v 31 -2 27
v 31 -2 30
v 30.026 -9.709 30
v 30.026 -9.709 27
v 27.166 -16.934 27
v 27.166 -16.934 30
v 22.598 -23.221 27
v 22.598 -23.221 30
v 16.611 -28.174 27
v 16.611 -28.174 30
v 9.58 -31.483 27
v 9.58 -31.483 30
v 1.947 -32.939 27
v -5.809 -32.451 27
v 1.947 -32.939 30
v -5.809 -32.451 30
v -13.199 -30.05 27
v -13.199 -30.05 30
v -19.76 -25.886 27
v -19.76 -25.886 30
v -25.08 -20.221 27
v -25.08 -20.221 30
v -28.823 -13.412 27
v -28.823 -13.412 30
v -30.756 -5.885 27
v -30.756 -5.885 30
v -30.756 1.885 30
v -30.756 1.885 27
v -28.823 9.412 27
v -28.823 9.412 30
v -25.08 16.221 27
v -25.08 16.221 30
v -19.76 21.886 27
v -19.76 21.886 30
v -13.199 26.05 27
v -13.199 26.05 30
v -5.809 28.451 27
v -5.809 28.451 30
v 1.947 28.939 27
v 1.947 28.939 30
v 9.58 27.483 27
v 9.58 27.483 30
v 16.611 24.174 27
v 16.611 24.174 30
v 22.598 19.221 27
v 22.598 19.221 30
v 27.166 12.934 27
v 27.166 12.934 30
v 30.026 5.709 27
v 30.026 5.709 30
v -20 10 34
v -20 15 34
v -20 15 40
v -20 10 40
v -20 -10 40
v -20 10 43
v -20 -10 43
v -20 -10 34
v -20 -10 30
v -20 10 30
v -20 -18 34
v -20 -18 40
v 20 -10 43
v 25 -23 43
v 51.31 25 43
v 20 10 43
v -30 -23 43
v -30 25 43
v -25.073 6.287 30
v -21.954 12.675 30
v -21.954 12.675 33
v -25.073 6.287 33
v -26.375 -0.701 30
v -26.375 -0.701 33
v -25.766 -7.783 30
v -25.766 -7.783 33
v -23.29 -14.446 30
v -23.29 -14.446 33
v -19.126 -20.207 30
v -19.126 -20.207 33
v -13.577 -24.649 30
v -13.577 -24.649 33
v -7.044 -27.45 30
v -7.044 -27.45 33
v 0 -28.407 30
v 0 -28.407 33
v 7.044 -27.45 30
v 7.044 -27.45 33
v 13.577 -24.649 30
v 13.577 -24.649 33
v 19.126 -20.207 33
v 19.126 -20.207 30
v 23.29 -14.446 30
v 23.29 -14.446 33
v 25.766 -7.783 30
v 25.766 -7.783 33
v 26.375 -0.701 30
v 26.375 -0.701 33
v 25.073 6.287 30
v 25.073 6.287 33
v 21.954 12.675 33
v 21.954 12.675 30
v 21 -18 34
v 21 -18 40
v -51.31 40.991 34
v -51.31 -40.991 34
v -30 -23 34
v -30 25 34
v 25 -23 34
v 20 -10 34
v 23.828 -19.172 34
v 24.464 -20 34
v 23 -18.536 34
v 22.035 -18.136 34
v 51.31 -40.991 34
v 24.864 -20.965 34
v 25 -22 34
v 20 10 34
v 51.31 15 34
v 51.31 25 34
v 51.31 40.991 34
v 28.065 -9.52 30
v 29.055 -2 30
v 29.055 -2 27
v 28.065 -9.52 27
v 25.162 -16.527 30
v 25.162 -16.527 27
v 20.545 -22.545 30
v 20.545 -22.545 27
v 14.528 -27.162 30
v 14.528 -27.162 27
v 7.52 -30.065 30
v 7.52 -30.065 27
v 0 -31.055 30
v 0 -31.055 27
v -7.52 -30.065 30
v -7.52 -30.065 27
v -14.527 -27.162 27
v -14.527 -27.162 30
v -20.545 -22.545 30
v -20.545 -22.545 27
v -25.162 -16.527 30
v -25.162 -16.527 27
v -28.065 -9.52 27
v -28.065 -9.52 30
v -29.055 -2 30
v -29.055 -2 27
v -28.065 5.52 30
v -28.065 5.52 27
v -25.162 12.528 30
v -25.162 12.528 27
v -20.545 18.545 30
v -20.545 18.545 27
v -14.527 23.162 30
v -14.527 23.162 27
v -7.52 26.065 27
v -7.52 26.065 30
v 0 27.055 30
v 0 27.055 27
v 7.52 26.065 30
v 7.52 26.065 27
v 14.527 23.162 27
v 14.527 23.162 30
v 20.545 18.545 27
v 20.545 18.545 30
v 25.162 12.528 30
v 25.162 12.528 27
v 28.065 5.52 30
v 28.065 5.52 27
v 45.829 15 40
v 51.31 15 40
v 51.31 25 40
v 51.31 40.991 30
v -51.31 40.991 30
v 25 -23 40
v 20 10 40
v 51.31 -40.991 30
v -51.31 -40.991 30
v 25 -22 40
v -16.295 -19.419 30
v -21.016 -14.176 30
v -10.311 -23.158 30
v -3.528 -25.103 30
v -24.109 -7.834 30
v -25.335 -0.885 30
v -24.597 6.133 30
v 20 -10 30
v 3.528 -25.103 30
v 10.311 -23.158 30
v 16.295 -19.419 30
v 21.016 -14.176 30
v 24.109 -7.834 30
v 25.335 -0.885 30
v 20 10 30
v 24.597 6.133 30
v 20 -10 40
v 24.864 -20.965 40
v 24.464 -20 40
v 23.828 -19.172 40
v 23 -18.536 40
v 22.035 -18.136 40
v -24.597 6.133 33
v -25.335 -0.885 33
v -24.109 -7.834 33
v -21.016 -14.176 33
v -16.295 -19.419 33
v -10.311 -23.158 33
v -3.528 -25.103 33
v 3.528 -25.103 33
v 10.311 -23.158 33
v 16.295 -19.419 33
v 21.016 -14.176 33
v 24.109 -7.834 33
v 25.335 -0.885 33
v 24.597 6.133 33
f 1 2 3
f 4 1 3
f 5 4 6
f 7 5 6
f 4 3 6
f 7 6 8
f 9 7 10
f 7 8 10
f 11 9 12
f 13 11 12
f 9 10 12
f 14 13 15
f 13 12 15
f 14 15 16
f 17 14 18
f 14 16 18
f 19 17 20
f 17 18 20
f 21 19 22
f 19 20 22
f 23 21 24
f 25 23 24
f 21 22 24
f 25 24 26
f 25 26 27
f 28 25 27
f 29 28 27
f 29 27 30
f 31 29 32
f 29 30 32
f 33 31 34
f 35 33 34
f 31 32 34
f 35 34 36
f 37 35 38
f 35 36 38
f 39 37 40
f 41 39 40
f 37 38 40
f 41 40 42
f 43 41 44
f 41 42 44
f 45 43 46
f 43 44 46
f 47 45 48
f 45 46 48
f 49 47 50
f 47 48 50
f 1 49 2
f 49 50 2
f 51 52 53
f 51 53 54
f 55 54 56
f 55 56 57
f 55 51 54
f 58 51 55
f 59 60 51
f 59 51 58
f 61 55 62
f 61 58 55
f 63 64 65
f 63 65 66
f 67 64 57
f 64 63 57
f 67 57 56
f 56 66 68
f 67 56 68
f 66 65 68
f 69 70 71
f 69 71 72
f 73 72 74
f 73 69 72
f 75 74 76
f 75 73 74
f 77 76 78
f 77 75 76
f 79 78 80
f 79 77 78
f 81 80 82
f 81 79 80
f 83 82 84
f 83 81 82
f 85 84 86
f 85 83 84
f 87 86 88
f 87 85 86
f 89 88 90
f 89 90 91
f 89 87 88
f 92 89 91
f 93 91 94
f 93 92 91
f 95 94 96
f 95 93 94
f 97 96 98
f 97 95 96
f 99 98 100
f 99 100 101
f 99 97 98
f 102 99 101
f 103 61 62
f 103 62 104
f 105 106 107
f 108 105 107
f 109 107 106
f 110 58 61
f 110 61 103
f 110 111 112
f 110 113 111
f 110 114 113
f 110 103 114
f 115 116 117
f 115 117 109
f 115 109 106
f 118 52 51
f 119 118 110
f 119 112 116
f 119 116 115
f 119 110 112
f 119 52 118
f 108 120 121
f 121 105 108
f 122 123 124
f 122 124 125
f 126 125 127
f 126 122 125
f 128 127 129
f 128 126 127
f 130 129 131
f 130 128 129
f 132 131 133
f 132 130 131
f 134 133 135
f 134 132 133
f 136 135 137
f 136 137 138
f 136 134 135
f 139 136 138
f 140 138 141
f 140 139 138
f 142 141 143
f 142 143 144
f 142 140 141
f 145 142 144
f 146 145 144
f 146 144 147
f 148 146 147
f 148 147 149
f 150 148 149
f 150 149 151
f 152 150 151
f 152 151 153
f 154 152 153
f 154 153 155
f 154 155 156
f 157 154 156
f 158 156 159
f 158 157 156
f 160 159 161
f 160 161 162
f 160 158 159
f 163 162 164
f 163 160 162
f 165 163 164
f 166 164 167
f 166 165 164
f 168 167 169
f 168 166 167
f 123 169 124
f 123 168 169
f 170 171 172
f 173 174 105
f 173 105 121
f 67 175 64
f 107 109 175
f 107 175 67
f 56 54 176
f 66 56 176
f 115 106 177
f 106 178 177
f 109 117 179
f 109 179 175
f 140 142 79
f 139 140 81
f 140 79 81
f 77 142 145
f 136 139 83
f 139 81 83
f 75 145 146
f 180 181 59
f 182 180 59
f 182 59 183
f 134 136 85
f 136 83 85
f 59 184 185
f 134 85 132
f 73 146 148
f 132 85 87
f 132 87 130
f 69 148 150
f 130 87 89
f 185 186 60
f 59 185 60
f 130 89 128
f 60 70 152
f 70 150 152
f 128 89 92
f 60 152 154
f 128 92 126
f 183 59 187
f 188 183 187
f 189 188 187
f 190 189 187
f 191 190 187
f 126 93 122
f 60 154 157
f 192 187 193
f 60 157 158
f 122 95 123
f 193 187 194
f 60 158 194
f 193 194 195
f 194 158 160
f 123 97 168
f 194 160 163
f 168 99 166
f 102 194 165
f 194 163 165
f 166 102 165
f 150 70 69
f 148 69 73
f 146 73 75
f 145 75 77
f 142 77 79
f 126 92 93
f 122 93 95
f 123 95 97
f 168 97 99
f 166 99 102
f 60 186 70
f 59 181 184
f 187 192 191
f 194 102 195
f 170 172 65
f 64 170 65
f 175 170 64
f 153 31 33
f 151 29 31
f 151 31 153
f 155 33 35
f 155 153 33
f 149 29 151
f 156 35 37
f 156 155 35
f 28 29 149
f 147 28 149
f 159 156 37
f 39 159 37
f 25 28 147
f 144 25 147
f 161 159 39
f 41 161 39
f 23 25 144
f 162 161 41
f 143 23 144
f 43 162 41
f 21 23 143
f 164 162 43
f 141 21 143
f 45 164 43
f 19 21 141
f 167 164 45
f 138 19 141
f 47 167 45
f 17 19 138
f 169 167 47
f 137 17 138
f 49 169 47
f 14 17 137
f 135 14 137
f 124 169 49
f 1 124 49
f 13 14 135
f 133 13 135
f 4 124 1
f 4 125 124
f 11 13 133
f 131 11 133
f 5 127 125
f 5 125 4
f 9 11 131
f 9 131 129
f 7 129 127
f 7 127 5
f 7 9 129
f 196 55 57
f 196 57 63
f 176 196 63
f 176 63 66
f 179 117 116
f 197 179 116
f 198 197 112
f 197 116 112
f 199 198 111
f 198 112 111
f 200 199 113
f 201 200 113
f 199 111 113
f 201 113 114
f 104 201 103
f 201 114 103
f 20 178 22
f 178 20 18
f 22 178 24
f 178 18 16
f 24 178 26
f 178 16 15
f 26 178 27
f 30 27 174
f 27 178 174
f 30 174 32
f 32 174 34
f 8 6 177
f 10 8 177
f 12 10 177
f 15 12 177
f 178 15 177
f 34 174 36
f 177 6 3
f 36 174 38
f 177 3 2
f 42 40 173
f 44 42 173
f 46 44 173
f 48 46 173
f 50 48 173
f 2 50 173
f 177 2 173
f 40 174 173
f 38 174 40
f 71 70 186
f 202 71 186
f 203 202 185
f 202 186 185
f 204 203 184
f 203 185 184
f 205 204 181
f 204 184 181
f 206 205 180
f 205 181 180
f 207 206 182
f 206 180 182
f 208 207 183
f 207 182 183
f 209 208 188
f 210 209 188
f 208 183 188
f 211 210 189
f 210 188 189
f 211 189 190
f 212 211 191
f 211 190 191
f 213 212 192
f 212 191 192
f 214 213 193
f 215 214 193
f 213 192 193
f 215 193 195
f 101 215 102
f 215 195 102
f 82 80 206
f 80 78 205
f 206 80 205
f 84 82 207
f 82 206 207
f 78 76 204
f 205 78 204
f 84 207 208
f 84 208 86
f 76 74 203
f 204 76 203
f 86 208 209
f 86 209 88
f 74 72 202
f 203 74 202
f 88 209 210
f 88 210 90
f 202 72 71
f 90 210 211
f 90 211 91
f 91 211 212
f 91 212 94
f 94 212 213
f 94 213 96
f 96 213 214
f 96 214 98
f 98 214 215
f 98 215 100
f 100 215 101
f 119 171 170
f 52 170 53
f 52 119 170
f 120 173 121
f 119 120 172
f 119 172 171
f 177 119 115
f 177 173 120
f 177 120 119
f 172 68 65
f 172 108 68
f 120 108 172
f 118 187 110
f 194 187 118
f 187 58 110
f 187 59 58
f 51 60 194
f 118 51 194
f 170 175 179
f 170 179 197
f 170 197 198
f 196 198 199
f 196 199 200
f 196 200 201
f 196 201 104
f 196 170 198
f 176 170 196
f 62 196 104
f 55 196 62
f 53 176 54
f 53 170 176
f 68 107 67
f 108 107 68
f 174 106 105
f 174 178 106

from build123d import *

# Parameters (mm, degrees)
SKETCH005_W     = 102.620446
SKETCH005_H     = 81.982758
PAD005_DEPTH    = 3
SKETCH006_W     = 102.620446
SKETCH006_H     = 81.982758
SKETCH006_W_2   = 40
SKETCH006_H_2   = 20
PAD006_DEPTH    = 1
PAD006_FACE18_W = 20
PAD006_FACE18_H = 40
POCKET_DEPTH    = 3.001
SKETCH007_R     = 31
SKETCH007_R_2   = 29.055
PAD007_DEPTH    = 3
PAD013_DEPTH    = 6
SKETCH014_W     = 40
SKETCH014_H     = 20
PAD014_DEPTH    = 3


with BuildPart() as part:
    # Sketch005 → Pad005 (new body)
    with BuildSketch(Plane.XY):
        Rectangle(SKETCH005_W, SKETCH005_H)
        with BuildLine():
            ThreePointArc((-21.953744, 12.675), (0, -25.35), (21.953744, 12.675))
            ThreePointArc((-21.953744, 12.675), (0, -28.406865), (21.953744, 12.675))
        make_face(mode=Mode.SUBTRACT)
    extrude(amount=PAD005_DEPTH)

    # Sketch006 (on Face8 of Pad005) → Pad006 (join)
    with BuildSketch(Plane.XY.offset(3)):
        Rectangle(SKETCH006_W, SKETCH006_H)
        Rectangle(SKETCH006_W_2, SKETCH006_H_2, mode=Mode.SUBTRACT)
    extrude(amount=PAD006_DEPTH)

    # Pad006 Face18 → Pocket (cut, through all)
    with BuildSketch(Plane(origin=(0, 0, 3), x_dir=(0, 1, 0), z_dir=(0, 0, 1))):
        Rectangle(PAD006_FACE18_W, PAD006_FACE18_H)
    extrude(amount=-POCKET_DEPTH, mode=Mode.SUBTRACT)

    # Sketch007 (on Face4 of Pocket) → Pad007 (join)
    with BuildSketch(Plane(origin=(0, 0, 0), x_dir=(1, 0, 0), z_dir=(0, 0, -1))):
        with Locations((0, 2)):
            Circle(SKETCH007_R)
        with Locations((0, 2)):
            Circle(SKETCH007_R_2, mode=Mode.SUBTRACT)
    extrude(amount=PAD007_DEPTH)

    # Sketch013 (on Face10 of Pad007) → Pad013 (join)
    with BuildSketch(Plane.XY.offset(4)):
        with BuildLine():
            Line((51.310223, 25), (51.310223, 15))
            Line((51.310223, 15), (-20, 15))
            Line((-20, 15), (-20, -18))
            Line((-20, -18), (21, -18))
            ThreePointArc((25, -22), (23.828427, -19.171573), (21, -18))
            Line((25, -22), (25, -23))
            Line((25, -23), (-30, -23))
            Line((-30, -23), (-30, 25))
            Line((-30, 25), (51.310223, 25))
        make_face()
    extrude(amount=PAD013_DEPTH)

    # Sketch014 (on Face25 of Pad013) → Pad014 (join)
    with BuildSketch(Plane.XY.offset(10)):
        Polygon((51.310223, 25), (25, -23), (-30, -23), (-30, 25), align=None)
        Rectangle(SKETCH014_W, SKETCH014_H, mode=Mode.SUBTRACT)
    extrude(amount=PAD014_DEPTH)


with BuildPart() as part_1:
    # Body002 placement: moved
    add(part.part.moved(Location((0, 0, 30))))


solid = part_1.part
